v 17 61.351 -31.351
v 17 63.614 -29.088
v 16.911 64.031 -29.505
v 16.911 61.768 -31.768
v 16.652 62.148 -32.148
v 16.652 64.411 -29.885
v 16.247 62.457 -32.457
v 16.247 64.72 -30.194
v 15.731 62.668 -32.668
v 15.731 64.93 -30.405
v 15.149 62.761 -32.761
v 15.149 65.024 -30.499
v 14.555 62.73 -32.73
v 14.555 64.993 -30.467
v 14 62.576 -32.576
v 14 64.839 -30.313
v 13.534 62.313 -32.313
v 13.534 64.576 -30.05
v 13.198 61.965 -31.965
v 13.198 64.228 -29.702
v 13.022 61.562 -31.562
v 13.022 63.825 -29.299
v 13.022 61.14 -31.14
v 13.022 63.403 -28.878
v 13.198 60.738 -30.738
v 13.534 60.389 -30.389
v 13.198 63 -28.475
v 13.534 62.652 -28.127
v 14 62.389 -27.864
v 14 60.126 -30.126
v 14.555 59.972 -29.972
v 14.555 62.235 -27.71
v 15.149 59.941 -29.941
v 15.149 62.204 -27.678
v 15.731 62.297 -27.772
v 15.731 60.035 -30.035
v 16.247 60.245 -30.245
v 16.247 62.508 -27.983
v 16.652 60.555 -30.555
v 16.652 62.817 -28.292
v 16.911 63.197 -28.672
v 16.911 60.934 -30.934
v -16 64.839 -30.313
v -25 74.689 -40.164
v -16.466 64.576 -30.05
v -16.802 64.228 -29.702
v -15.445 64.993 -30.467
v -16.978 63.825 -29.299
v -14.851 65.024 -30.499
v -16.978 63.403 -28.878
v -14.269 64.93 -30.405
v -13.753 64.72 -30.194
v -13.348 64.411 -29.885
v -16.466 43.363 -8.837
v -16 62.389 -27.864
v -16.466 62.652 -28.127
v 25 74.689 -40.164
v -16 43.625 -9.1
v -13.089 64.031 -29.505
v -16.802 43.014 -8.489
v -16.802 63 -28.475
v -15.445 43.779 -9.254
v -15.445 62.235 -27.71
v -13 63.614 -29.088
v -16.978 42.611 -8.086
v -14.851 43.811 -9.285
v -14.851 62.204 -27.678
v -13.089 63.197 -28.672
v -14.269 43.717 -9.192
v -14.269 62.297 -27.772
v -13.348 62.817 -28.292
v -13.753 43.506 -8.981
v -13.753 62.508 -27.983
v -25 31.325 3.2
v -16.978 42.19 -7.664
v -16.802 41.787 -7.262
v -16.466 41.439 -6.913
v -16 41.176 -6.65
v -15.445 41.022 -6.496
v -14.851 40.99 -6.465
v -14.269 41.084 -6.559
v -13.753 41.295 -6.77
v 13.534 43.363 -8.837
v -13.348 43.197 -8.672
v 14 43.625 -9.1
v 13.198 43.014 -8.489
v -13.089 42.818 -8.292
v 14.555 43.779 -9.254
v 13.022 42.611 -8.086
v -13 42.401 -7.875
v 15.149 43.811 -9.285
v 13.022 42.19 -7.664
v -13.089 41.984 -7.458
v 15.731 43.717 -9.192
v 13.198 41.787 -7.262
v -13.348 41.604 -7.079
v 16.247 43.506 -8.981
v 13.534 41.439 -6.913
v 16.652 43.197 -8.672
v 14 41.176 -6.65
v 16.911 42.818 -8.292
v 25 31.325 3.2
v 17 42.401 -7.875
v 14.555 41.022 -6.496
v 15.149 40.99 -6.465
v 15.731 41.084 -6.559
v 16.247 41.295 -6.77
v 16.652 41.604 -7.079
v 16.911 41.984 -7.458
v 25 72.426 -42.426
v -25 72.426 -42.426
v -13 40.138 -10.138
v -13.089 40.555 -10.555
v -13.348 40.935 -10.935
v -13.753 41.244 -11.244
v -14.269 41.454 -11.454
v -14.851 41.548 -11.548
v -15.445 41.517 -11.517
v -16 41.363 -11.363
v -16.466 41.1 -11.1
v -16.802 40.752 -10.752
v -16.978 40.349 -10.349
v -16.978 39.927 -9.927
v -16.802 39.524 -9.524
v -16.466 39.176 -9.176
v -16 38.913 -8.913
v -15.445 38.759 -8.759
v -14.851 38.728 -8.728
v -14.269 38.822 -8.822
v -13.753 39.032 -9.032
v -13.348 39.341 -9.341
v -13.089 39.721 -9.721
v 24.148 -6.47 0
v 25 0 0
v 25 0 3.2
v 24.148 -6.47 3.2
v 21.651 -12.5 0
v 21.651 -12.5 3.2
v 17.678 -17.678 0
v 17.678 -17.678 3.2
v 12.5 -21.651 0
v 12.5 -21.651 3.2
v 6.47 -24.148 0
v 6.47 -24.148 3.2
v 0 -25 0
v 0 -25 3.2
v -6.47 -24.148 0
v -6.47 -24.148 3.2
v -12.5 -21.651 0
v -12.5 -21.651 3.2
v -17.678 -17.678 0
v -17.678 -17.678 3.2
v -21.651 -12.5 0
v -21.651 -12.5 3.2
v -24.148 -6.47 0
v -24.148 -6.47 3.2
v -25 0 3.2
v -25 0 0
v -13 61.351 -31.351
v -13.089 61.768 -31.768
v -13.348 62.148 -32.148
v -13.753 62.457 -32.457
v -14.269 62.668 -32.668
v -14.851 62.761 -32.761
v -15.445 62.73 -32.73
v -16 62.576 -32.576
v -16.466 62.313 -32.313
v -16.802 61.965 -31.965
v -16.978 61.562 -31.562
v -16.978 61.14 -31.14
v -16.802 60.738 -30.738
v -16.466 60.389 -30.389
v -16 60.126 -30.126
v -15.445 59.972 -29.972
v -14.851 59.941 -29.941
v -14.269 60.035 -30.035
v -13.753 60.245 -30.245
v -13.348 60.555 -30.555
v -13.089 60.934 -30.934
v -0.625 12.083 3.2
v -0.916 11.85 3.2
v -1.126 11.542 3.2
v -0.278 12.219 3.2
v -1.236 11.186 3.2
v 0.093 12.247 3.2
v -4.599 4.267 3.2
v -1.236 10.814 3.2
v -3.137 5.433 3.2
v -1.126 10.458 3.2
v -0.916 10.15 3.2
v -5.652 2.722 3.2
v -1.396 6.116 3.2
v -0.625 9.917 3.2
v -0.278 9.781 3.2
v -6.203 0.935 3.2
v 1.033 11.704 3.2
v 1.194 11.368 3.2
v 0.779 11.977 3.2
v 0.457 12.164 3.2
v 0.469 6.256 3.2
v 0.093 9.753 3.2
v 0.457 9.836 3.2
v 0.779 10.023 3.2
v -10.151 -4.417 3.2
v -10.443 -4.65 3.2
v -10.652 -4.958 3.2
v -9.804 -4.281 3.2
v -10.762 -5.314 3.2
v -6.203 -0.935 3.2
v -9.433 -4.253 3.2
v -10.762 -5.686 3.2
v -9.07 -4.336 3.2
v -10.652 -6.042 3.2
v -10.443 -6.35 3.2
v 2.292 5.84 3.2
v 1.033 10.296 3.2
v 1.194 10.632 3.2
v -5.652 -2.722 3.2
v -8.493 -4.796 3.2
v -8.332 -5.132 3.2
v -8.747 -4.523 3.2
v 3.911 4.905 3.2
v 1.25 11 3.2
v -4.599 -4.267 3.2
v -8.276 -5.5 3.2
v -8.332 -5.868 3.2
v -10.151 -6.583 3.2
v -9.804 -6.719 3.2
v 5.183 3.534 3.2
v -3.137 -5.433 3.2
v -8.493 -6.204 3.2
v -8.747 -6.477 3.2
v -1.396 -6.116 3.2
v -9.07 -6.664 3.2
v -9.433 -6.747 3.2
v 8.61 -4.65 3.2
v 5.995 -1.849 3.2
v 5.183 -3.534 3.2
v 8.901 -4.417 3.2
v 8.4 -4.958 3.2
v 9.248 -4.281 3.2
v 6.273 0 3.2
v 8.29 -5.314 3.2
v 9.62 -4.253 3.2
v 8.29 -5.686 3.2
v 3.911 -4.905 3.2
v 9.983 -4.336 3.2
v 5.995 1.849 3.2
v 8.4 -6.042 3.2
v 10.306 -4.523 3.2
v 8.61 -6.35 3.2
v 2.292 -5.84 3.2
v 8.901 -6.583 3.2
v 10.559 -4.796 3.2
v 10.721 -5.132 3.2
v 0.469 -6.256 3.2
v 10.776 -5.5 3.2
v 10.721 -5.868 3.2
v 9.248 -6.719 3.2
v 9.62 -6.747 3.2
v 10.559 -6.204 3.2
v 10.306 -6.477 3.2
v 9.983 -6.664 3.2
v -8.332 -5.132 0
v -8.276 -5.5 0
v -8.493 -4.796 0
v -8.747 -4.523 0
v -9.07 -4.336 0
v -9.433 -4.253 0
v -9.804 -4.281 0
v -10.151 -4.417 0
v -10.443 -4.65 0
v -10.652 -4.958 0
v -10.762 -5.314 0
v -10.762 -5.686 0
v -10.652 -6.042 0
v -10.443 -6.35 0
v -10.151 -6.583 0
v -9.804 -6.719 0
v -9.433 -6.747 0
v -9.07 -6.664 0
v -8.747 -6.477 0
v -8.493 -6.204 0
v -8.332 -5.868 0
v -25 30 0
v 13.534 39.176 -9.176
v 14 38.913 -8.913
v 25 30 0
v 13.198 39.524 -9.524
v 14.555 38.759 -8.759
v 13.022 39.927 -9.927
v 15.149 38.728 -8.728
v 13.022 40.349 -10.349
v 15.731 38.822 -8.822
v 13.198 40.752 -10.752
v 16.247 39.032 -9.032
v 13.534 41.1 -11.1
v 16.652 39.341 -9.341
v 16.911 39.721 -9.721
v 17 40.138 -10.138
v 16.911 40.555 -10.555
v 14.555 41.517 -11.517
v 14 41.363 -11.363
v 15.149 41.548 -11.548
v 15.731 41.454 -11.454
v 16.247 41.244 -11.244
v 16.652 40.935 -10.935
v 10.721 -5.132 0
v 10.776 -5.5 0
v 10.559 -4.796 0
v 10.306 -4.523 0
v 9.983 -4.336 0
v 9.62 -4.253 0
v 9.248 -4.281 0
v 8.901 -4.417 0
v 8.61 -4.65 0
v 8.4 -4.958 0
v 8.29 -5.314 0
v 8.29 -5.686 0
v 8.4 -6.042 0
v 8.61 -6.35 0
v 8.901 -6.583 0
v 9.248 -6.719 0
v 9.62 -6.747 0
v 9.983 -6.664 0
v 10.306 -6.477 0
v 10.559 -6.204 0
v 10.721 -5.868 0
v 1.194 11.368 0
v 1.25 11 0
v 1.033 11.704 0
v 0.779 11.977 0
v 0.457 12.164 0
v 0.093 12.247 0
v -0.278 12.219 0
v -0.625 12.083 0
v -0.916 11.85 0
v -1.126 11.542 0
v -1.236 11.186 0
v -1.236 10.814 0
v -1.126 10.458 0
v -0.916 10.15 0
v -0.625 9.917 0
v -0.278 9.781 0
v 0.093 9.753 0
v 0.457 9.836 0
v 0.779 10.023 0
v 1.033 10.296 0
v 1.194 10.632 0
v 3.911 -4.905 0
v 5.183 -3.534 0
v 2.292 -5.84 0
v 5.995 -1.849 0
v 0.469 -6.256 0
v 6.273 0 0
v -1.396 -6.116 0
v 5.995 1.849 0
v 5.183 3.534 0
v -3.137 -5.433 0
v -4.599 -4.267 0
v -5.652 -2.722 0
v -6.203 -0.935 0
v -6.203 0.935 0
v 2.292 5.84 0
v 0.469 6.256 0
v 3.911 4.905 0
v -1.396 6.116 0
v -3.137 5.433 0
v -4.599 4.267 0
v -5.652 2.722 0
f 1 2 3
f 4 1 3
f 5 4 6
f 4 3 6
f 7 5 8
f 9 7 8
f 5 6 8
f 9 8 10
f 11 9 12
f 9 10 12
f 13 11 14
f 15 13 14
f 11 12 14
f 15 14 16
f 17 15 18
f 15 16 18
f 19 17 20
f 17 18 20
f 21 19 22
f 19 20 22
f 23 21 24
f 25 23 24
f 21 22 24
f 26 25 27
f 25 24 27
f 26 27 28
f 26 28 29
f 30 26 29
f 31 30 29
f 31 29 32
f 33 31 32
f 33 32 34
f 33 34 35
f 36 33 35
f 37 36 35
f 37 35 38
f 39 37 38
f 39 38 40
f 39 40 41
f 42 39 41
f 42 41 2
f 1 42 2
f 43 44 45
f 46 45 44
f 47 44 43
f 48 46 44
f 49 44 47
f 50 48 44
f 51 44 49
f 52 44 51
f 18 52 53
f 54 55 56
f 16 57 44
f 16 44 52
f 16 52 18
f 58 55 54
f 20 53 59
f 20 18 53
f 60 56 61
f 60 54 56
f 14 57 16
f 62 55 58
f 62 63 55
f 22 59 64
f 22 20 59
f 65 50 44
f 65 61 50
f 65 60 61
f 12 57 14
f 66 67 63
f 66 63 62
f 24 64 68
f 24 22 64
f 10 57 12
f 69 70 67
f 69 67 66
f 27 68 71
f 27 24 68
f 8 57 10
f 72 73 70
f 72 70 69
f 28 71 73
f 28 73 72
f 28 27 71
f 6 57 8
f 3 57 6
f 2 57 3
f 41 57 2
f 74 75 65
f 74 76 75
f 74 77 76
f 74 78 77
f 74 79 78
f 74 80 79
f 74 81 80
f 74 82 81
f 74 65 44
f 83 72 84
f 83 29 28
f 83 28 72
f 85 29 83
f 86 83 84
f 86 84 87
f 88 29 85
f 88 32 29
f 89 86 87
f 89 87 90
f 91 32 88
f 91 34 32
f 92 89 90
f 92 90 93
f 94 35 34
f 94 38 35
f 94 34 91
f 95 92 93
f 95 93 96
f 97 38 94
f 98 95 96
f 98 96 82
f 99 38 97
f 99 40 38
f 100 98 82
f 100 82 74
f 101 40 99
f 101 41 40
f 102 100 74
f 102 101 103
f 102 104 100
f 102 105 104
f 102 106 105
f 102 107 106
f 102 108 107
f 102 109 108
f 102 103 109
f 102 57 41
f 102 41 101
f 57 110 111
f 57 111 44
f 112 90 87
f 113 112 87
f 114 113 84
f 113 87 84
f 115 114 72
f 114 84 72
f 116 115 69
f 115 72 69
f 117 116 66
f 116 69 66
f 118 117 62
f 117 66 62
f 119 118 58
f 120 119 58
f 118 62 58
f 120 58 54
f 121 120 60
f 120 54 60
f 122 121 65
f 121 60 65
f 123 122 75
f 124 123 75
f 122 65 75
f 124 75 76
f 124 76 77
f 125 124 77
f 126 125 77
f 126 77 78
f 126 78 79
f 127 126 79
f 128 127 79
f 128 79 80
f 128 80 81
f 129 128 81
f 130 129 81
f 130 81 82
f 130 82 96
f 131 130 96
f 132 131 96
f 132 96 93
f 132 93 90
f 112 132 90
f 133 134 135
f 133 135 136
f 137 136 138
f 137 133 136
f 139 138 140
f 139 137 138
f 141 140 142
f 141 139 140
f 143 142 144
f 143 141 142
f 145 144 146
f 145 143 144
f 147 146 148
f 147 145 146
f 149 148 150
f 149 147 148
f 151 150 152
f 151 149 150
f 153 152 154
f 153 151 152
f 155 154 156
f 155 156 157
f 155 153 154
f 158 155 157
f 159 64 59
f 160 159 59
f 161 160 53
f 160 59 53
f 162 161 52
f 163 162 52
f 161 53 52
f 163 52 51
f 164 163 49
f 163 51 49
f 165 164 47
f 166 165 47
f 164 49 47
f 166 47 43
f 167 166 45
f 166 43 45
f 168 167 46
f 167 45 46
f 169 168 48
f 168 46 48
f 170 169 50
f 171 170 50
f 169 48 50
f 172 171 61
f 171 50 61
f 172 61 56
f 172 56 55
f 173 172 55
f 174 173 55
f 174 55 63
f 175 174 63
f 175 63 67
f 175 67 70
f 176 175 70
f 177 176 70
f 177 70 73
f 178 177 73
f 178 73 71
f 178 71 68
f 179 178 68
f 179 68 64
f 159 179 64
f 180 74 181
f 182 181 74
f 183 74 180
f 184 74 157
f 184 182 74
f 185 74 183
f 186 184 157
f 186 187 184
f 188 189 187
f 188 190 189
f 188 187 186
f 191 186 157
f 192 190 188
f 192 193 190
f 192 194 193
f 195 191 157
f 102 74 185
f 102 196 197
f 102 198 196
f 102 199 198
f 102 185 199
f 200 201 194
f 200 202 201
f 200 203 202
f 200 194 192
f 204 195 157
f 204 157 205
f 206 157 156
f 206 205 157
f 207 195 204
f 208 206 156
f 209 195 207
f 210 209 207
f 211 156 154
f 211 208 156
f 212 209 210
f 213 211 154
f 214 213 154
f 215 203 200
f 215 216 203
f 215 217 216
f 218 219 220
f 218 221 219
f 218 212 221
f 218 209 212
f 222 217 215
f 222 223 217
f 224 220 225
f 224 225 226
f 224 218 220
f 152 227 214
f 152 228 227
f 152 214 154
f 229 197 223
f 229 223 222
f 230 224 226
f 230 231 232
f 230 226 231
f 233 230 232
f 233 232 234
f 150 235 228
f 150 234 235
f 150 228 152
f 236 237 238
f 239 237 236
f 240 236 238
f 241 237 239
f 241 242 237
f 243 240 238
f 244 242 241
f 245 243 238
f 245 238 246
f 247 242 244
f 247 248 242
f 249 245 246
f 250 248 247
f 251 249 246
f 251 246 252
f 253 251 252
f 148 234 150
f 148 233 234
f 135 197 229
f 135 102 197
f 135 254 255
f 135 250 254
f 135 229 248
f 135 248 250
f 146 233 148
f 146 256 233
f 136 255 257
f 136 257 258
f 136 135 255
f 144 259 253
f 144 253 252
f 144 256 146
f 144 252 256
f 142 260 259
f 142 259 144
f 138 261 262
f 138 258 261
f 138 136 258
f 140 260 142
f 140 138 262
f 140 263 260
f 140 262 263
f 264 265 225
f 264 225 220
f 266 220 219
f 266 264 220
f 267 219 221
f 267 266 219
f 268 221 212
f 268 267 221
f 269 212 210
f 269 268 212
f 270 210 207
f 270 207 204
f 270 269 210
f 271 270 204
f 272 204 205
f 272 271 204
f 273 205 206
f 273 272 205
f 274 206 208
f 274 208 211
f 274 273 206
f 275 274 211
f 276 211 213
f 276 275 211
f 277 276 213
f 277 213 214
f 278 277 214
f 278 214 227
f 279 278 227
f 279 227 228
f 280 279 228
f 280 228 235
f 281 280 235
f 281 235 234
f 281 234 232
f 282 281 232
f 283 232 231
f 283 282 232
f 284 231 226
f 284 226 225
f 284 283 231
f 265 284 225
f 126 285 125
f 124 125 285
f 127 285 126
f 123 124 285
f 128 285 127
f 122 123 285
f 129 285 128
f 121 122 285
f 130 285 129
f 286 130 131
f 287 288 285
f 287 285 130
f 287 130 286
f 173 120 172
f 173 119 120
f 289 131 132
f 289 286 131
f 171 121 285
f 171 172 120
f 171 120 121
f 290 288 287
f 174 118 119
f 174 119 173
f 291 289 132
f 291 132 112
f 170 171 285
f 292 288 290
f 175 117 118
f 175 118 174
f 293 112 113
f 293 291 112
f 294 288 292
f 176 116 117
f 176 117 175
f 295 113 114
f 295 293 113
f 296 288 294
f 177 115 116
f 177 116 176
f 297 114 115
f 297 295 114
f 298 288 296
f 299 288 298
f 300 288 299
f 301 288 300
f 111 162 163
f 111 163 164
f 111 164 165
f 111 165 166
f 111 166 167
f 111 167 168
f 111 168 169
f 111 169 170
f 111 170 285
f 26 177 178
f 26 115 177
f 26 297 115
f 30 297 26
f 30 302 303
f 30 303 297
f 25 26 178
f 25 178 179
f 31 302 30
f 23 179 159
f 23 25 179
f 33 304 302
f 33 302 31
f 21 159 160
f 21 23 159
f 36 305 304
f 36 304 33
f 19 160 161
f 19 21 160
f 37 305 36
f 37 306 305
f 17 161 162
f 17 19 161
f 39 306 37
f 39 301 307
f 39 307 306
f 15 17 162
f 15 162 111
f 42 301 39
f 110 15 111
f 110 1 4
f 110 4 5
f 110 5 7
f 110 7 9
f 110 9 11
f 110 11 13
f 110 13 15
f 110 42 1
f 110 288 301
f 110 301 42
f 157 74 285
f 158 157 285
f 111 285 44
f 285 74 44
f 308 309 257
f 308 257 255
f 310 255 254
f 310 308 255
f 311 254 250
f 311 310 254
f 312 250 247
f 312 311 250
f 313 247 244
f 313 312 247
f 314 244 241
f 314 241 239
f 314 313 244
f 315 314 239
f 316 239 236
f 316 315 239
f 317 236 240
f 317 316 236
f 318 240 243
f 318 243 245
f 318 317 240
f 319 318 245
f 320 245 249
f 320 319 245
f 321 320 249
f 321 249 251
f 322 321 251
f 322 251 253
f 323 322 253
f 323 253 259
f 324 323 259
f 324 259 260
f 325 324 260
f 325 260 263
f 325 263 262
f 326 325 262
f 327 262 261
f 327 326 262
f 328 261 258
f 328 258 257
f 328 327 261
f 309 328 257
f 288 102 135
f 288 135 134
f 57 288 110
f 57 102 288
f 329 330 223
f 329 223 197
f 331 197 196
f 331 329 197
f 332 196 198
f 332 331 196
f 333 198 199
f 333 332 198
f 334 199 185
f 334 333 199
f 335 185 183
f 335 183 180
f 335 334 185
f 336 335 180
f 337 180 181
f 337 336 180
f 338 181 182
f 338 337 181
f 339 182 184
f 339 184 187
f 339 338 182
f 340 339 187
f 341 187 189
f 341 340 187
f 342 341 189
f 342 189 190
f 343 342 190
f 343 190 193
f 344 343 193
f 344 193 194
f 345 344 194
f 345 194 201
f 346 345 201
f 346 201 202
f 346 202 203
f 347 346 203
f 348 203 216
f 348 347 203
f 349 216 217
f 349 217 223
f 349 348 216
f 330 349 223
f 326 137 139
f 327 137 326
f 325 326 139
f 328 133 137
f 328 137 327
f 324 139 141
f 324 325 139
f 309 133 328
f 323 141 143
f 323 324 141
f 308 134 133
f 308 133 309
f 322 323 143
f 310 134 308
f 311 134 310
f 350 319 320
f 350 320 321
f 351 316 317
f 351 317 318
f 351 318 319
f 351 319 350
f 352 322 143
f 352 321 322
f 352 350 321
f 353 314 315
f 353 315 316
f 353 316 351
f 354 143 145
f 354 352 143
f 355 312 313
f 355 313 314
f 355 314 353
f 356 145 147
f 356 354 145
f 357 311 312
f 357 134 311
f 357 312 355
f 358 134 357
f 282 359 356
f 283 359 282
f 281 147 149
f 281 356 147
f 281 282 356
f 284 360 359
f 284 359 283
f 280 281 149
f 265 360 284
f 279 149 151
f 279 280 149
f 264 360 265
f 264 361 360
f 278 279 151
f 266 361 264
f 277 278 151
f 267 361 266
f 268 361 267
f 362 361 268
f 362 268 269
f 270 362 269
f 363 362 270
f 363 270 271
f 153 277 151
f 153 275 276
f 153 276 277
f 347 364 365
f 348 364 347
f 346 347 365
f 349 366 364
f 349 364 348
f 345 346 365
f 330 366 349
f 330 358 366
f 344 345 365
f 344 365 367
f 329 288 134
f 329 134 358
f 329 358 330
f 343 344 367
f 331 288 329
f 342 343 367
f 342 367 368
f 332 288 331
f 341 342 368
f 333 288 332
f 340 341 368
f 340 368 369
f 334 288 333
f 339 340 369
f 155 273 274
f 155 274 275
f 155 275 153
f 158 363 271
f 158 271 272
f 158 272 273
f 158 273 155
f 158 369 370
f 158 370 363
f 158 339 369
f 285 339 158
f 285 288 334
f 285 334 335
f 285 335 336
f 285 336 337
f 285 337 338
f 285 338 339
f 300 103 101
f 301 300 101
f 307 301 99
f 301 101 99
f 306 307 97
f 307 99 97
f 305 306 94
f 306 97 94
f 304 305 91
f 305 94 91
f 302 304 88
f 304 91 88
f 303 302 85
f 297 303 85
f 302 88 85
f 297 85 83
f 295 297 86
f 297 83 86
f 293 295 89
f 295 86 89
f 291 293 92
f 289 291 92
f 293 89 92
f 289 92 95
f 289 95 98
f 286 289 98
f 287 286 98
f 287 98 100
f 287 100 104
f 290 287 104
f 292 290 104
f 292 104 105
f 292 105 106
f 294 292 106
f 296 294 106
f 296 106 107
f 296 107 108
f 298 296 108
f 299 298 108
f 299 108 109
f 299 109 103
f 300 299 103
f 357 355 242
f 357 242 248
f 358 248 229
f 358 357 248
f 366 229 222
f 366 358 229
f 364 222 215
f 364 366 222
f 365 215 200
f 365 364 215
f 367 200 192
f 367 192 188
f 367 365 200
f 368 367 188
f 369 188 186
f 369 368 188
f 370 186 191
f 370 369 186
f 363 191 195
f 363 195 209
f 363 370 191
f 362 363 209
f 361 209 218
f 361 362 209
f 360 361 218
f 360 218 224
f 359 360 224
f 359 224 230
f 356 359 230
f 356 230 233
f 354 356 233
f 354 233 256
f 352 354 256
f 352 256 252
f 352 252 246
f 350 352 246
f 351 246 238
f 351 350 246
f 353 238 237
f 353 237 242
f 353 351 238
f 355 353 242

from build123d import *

# Parameters (mm, degrees)
SKETCH1_R           = 6.273243026
SKETCH1_R_2         = 1.25
BOSS_EXTRUDE1_DEPTH = 3.2
BOSS_EXTRUDE2_DEPTH = 50
CUT_EXTRUDE1_REACH  = 74.091
SKETCH3_R           = 2


with BuildPart() as part:
    # Sketch1 → Boss-Extrude1 (new body)
    with BuildSketch(Plane.XY):
        with BuildLine():
            Line((-25, 0), (-25, 30))
            Line((-25, 30), (25, 30))
            Line((25, 30), (25, 0))
            ThreePointArc((25, 0), (0, -25), (-25, 0))
        make_face()
        Circle(SKETCH1_R, mode=Mode.SUBTRACT)
        with Locations((0, 11)):
            Circle(SKETCH1_R_2, mode=Mode.SUBTRACT)
        with Locations((9.526279442, -5.5)):
            Circle(SKETCH1_R_2, mode=Mode.SUBTRACT)
        with Locations((-9.526279442, -5.5)):
            Circle(SKETCH1_R_2, mode=Mode.SUBTRACT)
    extrude(amount=BOSS_EXTRUDE1_DEPTH)

    # Sketch2 → Boss-Extrude2 (add)
    with BuildSketch(Plane(origin=(25, 0, 0), x_dir=(0, 0, -1), z_dir=(1, 0, 0))):
        Polygon((0, 30), (42.426406871, 72.426406871), (40.163665171, 74.689148571), (-3.2, 31.3254834), (-3.2, 30), align=None)
    extrude(amount=-BOSS_EXTRUDE2_DEPTH)

    # Sketch3 → Cut-Extrude1 (cut, up to next)
    with BuildSketch(Plane(origin=(0, 17.2627417, 17.2627417), x_dir=(1, 0, 0), z_dir=(0, 0.707106781, 0.707106781)), mode=Mode.PRIVATE) as cut_extrude1_sk1:
        with Locations((15, 65.550461736)):
            Circle(SKETCH3_R)
    cut_extrude1_tool1 = extrude(cut_extrude1_sk1.sketch, amount=-CUT_EXTRUDE1_REACH, mode=Mode.PRIVATE) & part.part
    add(cut_extrude1_tool1.solids().sort_by_distance((15, 63.613918, -29.088434))[0], mode=Mode.SUBTRACT)
    # Sketch3 → Cut-Extrude1 (cut, up to next)
    with BuildSketch(Plane(origin=(0, 17.2627417, 17.2627417), x_dir=(1, 0, 0), z_dir=(0, 0.707106781, 0.707106781)), mode=Mode.PRIVATE) as cut_extrude1_sk2:
        with Locations((15, 35.550461736)):
            Circle(SKETCH3_R)
    cut_extrude1_tool2 = extrude(cut_extrude1_sk2.sketch, amount=-CUT_EXTRUDE1_REACH, mode=Mode.PRIVATE) & part.part
    add(cut_extrude1_tool2.solids().sort_by_distance((15, 42.400714, -7.875231))[0], mode=Mode.SUBTRACT)
    # Sketch3 → Cut-Extrude1 (cut, up to next)
    with BuildSketch(Plane(origin=(0, 17.2627417, 17.2627417), x_dir=(1, 0, 0), z_dir=(0, 0.707106781, 0.707106781)), mode=Mode.PRIVATE) as cut_extrude1_sk3:
        with Locations((-15, 65.550461736)):
            Circle(SKETCH3_R)
    cut_extrude1_tool3 = extrude(cut_extrude1_sk3.sketch, amount=-CUT_EXTRUDE1_REACH, mode=Mode.PRIVATE) & part.part
    add(cut_extrude1_tool3.solids().sort_by_distance((-15, 63.613918, -29.088434))[0], mode=Mode.SUBTRACT)
    # Sketch3 → Cut-Extrude1 (cut, up to next)
    with BuildSketch(Plane(origin=(0, 17.2627417, 17.2627417), x_dir=(1, 0, 0), z_dir=(0, 0.707106781, 0.707106781)), mode=Mode.PRIVATE) as cut_extrude1_sk4:
        with Locations((-15, 35.550461736)):
            Circle(SKETCH3_R)
    cut_extrude1_tool4 = extrude(cut_extrude1_sk4.sketch, amount=-CUT_EXTRUDE1_REACH, mode=Mode.PRIVATE) & part.part
    add(cut_extrude1_tool4.solids().sort_by_distance((-15, 42.400714, -7.875231))[0], mode=Mode.SUBTRACT)


solid = part.part
